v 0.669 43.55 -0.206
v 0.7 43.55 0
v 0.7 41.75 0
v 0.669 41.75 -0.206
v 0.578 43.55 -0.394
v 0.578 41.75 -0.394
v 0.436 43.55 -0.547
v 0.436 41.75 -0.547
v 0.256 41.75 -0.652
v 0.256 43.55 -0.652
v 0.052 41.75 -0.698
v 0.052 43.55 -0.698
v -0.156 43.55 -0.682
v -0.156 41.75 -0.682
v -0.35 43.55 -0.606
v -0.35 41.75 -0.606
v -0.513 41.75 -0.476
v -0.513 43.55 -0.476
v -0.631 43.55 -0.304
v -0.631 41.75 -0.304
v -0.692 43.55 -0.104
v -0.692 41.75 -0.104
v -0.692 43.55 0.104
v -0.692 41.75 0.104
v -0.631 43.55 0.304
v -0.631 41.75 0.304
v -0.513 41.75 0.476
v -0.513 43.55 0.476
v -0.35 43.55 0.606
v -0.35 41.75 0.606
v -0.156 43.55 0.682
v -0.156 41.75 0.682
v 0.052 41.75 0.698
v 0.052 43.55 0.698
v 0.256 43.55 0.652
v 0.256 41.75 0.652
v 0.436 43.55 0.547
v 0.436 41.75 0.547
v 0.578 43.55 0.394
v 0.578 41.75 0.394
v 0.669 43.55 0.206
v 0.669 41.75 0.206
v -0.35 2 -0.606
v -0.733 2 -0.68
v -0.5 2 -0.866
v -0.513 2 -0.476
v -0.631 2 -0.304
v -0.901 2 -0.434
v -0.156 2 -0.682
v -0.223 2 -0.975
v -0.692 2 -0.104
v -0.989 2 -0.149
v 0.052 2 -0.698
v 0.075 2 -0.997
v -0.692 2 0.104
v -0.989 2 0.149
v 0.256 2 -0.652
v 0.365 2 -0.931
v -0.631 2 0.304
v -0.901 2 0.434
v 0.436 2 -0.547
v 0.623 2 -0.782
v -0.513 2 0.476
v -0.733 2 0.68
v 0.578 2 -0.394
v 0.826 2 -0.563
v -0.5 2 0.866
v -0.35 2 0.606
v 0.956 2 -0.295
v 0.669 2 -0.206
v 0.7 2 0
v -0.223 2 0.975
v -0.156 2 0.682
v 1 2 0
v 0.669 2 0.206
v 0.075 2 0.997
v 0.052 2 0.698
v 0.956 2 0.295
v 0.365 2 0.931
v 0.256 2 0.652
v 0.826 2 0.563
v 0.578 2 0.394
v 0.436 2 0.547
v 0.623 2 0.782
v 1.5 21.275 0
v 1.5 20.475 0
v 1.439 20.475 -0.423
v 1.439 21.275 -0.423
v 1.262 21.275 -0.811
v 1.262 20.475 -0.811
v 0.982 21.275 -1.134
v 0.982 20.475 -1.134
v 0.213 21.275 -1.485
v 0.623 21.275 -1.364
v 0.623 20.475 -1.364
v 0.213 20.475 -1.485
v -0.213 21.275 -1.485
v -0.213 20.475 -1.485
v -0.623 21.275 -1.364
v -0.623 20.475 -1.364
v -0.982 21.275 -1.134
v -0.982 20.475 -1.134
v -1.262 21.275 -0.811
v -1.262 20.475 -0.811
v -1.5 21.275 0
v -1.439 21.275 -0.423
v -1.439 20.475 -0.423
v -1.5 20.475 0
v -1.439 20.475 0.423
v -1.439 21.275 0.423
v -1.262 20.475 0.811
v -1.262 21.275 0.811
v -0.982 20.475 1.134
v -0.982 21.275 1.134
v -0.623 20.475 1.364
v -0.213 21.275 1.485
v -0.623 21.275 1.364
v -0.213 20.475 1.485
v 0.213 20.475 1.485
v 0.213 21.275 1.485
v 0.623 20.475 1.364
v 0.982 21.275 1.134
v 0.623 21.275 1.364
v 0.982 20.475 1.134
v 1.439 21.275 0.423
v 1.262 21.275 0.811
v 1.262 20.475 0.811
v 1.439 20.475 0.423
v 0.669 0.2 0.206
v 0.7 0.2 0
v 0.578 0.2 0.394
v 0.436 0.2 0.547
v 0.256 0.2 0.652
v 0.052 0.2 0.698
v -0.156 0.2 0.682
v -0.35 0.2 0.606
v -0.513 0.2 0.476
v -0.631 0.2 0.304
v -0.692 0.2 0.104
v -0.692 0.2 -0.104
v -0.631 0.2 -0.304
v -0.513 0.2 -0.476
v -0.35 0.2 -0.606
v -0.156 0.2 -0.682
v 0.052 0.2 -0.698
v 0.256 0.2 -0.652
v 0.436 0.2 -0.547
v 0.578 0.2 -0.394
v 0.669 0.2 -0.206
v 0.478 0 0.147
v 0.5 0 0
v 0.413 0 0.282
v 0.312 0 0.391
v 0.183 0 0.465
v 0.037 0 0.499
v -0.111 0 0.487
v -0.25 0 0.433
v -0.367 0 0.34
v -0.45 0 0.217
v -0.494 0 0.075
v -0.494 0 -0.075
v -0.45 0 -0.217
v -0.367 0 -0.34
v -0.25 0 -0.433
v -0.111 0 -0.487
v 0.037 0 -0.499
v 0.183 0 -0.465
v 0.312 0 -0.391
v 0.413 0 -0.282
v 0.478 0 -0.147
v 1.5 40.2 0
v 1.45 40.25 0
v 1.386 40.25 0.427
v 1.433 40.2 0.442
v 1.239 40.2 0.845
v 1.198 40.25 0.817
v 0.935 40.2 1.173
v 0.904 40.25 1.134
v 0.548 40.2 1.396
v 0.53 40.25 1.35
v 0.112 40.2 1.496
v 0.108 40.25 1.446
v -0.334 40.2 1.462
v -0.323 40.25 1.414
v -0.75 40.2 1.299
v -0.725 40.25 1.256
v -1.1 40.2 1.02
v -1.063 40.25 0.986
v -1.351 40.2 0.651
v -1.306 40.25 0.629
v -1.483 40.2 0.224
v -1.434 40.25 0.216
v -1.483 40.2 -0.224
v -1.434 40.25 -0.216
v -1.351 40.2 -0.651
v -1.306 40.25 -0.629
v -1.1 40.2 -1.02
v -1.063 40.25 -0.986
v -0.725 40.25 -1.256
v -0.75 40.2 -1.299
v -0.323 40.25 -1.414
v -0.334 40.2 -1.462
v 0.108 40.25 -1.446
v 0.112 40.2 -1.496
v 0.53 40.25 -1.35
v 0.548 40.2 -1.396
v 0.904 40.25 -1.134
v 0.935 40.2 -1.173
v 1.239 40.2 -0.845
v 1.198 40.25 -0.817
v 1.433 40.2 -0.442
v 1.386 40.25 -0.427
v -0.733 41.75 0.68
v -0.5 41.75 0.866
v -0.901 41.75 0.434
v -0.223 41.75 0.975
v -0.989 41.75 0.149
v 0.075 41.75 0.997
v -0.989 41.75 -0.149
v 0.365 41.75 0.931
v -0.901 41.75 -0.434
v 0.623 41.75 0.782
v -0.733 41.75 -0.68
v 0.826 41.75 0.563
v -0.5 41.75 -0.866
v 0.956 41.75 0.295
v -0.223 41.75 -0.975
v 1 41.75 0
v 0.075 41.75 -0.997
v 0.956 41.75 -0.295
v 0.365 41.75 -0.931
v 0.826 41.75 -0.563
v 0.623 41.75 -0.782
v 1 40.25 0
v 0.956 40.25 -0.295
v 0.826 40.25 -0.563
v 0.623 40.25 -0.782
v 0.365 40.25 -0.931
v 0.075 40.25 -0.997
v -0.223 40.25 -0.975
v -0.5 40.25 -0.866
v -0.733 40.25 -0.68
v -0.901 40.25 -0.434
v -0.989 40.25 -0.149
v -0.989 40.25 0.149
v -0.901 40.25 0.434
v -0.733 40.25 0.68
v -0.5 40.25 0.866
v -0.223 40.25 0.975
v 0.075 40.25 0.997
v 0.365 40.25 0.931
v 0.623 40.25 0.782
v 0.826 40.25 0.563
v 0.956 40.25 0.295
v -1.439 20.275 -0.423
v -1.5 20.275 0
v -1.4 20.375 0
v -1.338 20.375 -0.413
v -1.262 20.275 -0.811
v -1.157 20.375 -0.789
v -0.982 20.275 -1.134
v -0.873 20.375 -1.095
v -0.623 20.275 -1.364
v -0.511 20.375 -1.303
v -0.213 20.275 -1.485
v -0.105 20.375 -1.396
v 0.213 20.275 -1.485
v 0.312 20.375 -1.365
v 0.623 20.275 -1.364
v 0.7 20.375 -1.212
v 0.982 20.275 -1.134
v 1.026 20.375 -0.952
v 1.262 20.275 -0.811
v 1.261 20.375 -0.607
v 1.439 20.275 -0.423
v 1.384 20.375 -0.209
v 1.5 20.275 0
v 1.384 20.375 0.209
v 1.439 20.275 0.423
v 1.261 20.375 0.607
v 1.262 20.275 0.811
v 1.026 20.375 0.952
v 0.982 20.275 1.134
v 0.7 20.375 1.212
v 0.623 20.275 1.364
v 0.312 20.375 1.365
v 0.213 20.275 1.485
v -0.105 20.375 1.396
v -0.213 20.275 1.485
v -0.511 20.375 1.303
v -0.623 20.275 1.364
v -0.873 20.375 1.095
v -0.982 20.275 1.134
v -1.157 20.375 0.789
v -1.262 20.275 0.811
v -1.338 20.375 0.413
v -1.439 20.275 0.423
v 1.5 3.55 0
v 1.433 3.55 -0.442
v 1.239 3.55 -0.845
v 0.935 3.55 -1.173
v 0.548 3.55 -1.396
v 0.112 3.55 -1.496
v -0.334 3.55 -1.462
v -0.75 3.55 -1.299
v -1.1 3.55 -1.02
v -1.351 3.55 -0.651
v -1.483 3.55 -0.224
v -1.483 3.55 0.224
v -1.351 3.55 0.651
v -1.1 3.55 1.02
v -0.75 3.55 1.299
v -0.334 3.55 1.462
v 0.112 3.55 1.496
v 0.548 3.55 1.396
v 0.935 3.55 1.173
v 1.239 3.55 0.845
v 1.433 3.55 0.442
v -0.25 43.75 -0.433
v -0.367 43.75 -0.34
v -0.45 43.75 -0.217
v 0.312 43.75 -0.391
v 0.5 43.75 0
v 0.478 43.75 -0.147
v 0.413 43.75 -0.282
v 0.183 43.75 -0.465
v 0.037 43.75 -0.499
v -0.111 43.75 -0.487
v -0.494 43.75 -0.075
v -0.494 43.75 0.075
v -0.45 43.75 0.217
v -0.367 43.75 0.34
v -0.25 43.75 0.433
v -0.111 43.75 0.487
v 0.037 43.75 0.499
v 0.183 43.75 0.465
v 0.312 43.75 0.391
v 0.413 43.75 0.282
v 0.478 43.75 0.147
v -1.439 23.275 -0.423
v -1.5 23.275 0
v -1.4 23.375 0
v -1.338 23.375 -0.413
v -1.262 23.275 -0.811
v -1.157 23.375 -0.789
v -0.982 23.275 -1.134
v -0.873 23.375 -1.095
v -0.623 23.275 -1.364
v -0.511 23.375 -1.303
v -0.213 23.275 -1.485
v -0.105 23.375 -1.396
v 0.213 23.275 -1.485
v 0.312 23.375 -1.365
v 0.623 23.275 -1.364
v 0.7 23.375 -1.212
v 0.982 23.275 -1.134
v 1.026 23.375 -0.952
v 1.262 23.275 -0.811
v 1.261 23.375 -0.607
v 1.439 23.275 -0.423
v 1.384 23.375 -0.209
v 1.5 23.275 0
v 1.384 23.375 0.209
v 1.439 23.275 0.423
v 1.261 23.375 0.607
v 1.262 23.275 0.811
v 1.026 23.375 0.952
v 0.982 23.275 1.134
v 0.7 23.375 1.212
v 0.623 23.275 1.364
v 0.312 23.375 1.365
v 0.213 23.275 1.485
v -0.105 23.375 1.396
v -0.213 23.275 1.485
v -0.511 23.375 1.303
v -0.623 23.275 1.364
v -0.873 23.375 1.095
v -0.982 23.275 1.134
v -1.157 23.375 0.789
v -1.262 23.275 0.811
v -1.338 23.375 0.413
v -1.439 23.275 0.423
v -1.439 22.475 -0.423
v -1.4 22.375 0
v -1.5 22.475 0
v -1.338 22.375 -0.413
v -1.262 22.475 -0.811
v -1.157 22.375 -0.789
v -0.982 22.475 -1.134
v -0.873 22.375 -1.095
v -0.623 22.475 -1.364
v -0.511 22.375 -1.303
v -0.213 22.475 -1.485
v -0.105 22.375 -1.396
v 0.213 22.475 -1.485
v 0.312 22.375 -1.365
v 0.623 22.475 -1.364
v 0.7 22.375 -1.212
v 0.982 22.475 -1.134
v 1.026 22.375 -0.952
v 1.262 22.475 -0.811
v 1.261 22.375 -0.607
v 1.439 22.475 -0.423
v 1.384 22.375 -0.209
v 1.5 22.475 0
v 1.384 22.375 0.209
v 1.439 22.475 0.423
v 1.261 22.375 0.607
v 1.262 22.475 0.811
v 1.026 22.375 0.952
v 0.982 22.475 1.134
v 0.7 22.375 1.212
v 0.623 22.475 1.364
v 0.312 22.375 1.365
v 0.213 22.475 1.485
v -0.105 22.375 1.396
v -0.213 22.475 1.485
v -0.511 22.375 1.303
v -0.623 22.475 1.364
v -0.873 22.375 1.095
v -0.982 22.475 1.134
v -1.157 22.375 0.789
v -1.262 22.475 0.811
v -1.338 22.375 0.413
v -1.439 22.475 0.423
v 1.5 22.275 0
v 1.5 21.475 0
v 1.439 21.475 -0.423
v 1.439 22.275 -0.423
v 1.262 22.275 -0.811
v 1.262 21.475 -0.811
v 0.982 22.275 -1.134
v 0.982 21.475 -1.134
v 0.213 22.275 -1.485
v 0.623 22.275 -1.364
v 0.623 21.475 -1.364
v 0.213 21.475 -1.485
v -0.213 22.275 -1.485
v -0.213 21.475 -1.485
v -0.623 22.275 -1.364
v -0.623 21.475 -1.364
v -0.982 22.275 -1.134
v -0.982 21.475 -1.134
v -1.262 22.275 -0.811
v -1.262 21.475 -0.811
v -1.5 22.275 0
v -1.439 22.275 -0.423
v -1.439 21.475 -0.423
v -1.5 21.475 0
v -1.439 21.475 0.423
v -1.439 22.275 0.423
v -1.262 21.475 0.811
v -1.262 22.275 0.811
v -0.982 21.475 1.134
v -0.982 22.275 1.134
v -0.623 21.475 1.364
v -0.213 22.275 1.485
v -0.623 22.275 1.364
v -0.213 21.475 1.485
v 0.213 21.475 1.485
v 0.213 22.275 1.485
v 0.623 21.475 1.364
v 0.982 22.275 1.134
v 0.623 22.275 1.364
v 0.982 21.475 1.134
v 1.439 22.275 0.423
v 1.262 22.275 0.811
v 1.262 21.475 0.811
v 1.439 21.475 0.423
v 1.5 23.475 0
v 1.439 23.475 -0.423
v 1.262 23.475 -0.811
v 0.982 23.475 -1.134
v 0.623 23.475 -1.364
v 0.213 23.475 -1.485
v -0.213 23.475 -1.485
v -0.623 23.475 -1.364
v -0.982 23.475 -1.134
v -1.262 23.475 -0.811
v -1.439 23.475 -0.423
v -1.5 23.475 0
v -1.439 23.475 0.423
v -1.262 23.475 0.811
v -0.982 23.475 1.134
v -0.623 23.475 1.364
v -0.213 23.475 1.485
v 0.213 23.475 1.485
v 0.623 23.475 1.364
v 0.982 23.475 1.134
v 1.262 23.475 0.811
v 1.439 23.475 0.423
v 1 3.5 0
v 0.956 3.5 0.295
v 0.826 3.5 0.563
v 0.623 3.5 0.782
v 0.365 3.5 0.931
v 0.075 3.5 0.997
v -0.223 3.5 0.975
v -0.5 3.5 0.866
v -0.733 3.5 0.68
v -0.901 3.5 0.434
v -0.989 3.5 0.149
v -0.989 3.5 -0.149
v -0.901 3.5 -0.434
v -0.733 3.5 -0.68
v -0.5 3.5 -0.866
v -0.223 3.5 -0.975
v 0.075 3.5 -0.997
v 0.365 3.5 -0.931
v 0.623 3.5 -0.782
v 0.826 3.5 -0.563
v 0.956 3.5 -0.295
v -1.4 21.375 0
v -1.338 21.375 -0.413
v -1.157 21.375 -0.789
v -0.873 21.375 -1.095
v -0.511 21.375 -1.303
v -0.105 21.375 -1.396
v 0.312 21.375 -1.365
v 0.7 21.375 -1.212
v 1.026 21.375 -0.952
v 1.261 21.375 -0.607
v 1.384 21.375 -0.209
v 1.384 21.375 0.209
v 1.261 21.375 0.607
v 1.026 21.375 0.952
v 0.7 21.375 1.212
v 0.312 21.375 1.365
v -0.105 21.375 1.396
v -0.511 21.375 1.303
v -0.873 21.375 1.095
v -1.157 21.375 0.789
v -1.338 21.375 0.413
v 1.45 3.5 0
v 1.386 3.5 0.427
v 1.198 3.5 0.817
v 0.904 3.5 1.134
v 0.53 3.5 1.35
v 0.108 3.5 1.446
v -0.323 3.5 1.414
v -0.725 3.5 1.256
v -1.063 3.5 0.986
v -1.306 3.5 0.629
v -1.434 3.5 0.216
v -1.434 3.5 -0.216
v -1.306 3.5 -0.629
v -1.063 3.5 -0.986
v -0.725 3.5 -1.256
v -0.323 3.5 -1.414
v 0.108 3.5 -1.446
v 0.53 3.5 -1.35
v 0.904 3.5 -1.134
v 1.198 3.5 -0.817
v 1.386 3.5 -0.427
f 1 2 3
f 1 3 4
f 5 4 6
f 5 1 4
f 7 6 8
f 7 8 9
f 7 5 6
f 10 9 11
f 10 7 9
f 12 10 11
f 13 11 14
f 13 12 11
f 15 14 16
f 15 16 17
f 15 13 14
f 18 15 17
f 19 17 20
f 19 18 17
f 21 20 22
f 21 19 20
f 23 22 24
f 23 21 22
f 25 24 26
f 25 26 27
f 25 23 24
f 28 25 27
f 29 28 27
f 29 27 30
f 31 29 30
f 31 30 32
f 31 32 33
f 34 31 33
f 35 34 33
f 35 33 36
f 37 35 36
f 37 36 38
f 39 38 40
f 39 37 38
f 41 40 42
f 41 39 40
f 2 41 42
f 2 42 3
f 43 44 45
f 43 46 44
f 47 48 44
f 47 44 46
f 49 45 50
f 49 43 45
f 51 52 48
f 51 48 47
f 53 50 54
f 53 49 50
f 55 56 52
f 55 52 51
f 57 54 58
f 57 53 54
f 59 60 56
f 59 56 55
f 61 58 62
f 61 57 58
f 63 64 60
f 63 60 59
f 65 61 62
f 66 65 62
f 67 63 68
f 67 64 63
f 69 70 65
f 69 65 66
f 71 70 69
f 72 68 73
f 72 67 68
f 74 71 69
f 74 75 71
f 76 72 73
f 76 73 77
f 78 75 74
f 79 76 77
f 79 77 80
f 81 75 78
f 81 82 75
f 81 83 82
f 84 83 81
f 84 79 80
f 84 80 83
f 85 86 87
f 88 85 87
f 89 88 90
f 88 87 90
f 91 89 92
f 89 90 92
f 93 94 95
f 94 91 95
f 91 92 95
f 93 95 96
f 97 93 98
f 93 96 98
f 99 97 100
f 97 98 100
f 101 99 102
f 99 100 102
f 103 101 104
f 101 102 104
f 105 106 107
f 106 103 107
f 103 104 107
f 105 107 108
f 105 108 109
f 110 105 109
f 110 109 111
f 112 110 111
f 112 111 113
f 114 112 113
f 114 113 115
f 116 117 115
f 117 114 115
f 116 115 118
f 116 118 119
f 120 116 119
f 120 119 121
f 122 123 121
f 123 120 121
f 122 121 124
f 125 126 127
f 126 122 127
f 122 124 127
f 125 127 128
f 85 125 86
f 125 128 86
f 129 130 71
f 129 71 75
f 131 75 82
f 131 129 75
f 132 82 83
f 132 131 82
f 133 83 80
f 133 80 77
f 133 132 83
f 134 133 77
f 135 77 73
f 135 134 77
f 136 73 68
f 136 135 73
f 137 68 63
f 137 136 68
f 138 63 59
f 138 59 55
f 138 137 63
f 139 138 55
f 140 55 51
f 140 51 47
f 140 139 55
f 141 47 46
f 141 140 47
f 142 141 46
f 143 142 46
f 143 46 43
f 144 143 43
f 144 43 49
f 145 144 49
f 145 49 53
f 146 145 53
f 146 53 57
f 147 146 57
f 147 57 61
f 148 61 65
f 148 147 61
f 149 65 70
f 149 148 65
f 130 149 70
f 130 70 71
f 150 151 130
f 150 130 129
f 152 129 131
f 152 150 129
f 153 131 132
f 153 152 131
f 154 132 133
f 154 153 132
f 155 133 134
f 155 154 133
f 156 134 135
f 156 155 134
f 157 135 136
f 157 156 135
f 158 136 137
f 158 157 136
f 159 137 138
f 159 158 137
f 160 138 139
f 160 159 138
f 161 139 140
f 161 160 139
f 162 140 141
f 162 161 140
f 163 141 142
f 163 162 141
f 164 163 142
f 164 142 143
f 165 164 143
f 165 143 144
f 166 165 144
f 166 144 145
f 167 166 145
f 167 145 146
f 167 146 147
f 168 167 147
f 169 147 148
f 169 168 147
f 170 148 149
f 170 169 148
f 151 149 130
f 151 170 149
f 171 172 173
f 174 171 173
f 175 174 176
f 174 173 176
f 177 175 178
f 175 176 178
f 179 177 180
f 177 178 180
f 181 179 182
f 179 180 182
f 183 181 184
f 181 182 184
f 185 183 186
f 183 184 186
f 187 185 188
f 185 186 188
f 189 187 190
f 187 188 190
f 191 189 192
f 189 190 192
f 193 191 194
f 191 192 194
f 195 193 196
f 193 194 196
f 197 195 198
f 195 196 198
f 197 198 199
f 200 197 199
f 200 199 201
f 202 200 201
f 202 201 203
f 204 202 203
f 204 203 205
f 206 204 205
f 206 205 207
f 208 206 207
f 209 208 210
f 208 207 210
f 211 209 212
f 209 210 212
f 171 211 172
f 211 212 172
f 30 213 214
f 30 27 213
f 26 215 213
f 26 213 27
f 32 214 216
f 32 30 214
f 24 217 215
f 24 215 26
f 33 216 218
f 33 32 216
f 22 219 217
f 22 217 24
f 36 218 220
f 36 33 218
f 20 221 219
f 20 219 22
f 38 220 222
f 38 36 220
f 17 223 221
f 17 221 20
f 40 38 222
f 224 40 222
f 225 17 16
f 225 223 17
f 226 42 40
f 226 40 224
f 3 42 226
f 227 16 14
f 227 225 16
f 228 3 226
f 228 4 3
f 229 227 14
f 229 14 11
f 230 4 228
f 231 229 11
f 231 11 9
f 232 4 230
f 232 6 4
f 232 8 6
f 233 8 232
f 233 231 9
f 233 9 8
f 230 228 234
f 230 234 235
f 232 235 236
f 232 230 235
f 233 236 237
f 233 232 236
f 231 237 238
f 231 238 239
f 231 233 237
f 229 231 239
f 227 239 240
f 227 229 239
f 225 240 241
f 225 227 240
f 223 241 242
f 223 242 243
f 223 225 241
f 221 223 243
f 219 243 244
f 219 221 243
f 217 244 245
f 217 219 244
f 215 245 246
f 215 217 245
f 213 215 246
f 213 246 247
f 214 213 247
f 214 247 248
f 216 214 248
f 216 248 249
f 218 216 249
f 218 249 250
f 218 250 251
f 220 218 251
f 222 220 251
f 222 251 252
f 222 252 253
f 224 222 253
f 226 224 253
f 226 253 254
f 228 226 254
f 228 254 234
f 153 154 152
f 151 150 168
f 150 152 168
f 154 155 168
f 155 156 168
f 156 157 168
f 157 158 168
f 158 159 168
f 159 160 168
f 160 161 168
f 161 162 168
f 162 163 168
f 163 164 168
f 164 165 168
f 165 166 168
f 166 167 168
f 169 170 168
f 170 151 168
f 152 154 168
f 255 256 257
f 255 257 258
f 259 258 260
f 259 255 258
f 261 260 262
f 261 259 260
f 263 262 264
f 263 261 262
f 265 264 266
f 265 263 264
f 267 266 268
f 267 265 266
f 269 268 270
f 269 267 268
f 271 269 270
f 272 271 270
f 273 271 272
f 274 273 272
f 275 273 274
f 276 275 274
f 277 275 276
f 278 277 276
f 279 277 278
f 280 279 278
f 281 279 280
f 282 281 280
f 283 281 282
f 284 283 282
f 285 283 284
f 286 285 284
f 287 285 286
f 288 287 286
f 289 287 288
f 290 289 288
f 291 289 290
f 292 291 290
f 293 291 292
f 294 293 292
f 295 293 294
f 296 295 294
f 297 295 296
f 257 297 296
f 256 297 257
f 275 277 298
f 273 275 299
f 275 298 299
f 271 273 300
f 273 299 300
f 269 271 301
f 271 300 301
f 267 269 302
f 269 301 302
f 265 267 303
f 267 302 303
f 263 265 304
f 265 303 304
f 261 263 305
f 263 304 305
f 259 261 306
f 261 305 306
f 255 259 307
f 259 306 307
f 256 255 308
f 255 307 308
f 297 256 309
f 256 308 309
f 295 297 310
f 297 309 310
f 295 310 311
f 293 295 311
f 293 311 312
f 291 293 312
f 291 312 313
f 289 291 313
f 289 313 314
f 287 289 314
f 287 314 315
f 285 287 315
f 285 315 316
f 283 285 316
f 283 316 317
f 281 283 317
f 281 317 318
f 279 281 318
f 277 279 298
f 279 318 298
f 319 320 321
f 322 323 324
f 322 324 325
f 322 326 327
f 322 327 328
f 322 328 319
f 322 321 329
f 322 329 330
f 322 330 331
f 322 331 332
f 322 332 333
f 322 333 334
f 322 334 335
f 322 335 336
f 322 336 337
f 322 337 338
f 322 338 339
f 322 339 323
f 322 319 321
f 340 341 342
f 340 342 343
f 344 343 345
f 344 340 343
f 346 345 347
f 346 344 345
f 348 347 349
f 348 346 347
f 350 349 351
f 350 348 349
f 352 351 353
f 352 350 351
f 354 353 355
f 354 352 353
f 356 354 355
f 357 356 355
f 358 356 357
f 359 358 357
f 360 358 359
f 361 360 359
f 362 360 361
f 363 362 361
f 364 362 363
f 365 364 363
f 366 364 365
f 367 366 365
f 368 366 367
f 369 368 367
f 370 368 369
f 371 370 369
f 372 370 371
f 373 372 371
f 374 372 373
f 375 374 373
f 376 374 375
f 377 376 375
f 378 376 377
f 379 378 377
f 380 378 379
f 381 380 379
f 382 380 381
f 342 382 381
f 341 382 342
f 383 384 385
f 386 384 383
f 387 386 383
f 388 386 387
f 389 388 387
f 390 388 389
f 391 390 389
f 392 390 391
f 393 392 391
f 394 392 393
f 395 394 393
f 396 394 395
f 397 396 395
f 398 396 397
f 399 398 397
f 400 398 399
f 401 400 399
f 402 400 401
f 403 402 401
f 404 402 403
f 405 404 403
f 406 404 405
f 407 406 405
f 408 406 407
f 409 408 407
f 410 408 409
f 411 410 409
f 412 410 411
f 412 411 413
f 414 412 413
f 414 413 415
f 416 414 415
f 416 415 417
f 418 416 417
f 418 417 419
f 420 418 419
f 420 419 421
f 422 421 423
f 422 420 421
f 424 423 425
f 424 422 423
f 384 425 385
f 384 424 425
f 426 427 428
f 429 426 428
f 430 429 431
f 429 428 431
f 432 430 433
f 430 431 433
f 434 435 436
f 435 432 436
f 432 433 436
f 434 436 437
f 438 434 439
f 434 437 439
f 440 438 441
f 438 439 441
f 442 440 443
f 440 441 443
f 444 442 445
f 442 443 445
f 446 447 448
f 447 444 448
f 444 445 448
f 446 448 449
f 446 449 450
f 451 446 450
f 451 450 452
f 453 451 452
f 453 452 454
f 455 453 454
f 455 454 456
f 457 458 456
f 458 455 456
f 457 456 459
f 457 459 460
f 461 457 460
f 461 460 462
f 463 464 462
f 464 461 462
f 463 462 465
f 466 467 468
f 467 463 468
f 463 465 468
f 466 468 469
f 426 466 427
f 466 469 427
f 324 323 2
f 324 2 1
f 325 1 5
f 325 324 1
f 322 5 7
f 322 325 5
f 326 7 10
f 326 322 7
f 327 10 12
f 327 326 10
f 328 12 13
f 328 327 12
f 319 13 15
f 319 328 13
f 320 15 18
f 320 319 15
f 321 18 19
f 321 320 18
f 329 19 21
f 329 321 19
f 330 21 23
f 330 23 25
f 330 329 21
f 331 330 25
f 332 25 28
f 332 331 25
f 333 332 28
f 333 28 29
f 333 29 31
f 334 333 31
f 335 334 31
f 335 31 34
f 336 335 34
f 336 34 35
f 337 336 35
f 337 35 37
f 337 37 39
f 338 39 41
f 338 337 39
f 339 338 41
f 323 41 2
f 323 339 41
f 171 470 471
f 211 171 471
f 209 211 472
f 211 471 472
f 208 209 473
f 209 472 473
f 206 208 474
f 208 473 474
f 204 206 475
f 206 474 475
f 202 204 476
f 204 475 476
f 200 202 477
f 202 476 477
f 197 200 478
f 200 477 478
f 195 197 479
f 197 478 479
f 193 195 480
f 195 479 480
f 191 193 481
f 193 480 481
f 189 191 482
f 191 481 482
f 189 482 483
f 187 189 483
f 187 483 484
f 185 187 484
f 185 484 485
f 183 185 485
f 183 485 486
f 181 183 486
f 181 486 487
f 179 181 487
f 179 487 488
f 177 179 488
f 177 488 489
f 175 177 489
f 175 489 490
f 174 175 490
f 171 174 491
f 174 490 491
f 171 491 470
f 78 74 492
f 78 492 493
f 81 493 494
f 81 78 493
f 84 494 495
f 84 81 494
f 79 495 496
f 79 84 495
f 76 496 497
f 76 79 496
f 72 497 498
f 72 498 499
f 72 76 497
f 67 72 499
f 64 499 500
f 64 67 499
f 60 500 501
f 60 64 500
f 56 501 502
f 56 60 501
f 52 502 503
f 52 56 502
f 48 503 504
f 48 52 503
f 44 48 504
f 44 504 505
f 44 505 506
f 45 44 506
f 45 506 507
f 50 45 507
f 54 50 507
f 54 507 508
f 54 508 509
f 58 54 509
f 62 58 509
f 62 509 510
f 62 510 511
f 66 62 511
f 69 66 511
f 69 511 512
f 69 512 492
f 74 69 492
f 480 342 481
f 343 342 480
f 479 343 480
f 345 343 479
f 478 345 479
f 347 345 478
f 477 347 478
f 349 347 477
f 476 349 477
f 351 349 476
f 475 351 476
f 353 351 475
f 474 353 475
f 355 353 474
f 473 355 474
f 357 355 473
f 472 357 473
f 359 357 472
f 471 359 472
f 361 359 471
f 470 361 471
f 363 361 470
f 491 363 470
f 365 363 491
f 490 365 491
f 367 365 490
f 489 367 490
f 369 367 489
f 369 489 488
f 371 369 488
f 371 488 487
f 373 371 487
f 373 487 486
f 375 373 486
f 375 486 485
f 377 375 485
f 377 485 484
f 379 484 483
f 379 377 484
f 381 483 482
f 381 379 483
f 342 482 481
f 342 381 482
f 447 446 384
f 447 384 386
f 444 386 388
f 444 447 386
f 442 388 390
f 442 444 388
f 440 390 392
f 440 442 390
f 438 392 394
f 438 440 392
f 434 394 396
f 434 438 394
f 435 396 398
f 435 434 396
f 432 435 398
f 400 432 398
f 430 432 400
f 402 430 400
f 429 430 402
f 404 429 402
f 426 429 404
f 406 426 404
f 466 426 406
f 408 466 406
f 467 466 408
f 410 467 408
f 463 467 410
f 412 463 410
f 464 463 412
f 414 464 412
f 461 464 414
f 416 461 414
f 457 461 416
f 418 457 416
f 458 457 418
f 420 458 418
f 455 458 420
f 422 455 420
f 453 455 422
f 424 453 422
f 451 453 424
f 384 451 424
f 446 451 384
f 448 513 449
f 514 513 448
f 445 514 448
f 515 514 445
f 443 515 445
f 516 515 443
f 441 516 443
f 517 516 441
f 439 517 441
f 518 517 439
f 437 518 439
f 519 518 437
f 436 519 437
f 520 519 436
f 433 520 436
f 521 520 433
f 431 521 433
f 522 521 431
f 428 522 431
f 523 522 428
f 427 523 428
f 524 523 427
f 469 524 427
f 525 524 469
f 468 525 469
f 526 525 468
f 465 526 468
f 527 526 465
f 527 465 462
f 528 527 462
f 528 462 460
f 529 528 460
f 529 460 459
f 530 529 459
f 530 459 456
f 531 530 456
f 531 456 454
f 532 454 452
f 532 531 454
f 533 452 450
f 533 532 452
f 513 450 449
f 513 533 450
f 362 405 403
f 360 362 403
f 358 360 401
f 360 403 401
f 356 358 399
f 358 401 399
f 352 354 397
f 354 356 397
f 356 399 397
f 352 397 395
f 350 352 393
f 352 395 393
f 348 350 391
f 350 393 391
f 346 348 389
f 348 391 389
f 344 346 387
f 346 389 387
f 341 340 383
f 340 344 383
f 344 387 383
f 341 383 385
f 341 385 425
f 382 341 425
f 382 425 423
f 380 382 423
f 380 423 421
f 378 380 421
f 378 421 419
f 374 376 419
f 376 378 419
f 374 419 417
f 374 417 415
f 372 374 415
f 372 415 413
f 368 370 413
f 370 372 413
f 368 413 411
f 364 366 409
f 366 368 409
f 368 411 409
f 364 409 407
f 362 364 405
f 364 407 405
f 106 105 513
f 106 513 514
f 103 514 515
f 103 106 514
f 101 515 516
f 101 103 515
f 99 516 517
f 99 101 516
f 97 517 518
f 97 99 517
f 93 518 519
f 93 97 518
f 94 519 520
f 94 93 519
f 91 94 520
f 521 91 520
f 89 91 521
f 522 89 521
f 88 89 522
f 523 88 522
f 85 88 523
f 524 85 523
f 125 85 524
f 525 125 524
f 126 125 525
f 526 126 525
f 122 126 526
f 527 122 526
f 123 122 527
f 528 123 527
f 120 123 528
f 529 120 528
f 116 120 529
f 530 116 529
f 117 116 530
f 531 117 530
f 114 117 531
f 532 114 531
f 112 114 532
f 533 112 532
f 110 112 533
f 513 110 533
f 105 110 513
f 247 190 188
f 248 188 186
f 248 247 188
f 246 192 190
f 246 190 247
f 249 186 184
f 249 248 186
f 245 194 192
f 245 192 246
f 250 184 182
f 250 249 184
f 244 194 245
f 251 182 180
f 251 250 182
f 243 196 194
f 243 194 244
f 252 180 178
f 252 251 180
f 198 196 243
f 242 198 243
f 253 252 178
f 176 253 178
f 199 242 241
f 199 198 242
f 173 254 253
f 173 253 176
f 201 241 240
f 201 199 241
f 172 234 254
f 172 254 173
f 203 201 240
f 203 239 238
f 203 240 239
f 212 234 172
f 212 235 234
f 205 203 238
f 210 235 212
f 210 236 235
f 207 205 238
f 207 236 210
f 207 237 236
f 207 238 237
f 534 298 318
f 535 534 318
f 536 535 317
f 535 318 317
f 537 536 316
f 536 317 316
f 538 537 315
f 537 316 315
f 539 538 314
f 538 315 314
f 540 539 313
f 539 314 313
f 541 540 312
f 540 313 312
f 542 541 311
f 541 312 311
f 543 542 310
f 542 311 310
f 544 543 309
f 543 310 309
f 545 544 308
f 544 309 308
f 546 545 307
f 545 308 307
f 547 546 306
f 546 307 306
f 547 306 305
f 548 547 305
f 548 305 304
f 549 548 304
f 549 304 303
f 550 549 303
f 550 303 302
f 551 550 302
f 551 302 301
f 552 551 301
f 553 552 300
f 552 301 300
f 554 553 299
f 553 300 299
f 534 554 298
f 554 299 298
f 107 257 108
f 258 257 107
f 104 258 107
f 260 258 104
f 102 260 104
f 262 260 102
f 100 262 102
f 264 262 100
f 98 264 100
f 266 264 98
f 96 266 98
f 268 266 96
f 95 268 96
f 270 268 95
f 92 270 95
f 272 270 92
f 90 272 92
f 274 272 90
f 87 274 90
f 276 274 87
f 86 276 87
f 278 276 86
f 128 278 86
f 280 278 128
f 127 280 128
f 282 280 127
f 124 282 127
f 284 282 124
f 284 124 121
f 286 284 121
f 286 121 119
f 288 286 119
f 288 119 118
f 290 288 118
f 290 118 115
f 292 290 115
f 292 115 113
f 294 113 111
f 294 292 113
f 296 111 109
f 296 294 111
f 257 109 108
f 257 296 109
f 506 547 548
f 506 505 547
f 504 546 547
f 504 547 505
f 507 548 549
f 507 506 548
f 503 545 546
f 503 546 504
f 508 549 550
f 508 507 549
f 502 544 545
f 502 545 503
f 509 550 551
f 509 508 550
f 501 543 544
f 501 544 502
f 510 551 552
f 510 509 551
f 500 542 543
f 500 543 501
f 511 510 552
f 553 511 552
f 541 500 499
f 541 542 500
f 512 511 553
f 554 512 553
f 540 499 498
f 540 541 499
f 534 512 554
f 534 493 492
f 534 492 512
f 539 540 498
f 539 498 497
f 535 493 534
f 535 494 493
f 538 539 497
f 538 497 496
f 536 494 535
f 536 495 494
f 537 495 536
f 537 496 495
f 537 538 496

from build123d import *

# Parameters (mm, degrees)
SKETCH1_R           = 1.5
BOSS_EXTRUDE1_DEPTH = 43.75
SKETCH2_OUTSIDE_W   = 13.792
SKETCH2_OUTSIDE_H   = 13.792
SKETCH2_OUTSIDE_R   = 1
CUT_EXTRUDE1_DEPTH  = 3.5
SKETCH3_OUTSIDE_W   = 13.792
SKETCH3_OUTSIDE_H   = 13.792
SKETCH3_OUTSIDE_R   = 0.7
CUT_EXTRUDE2_DEPTH  = 2
SKETCH4_OUTSIDE_W   = 13.792
SKETCH4_OUTSIDE_H   = 13.792
SKETCH4_OUTSIDE_R   = 1
CUT_EXTRUDE5_DEPTH  = 3.5
SKETCH5_OUTSIDE_W   = 13.792
SKETCH5_OUTSIDE_H   = 13.792
SKETCH5_OUTSIDE_R   = 0.7
CUT_EXTRUDE6_DEPTH  = 2
LPATTERN1_COUNT     = 4
LPATTERN1_PITCH     = 1
CHAMFER3_SIZE       = 0.2
CHAMFER4_SIZE       = 0.05


with BuildPart() as part:
    # Sketch1 → Boss-Extrude1 (new body)
    with BuildSketch(Plane(origin=(0, 0, 0), x_dir=(1, 0, 0), z_dir=(0, 1, 0))):
        Circle(SKETCH1_R)
    extrude(amount=BOSS_EXTRUDE1_DEPTH)

    # Sketch2 outside → Cut-Extrude1 (cut)
    with BuildSketch(Plane(origin=(0, 43.75, 0), x_dir=(1, 0, 0), z_dir=(0, 1, 0))):
        Rectangle(SKETCH2_OUTSIDE_W, SKETCH2_OUTSIDE_H)
        Circle(SKETCH2_OUTSIDE_R, mode=Mode.SUBTRACT)
    extrude(amount=-CUT_EXTRUDE1_DEPTH, mode=Mode.SUBTRACT)

    # Sketch3 outside → Cut-Extrude2 (cut)
    with BuildSketch(Plane(origin=(0, 43.75, 0), x_dir=(1, 0, 0), z_dir=(0, 1, 0))):
        Rectangle(SKETCH3_OUTSIDE_W, SKETCH3_OUTSIDE_H)
        Circle(SKETCH3_OUTSIDE_R, mode=Mode.SUBTRACT)
    extrude(amount=-CUT_EXTRUDE2_DEPTH, mode=Mode.SUBTRACT)

    # Sketch4 outside → Cut-Extrude5 (cut)
    with BuildSketch(Plane.XZ):
        Rectangle(SKETCH4_OUTSIDE_W, SKETCH4_OUTSIDE_H)
        Circle(SKETCH4_OUTSIDE_R, mode=Mode.SUBTRACT)
    extrude(amount=-CUT_EXTRUDE5_DEPTH, mode=Mode.SUBTRACT)

    # Sketch5 outside → Cut-Extrude6 (cut)
    with BuildSketch(Plane.XZ):
        Rectangle(SKETCH5_OUTSIDE_W, SKETCH5_OUTSIDE_H)
        Circle(SKETCH5_OUTSIDE_R, mode=Mode.SUBTRACT)
    extrude(amount=-CUT_EXTRUDE6_DEPTH, mode=Mode.SUBTRACT)

    # Sketch6 → Cut-Revolve1 (revolve, cut)
    with BuildSketch(Plane.XY):
        Polygon((-1.5, 23.475), (-1.4, 23.375), (-1.5, 23.275), align=None)
    cut_revolve1 = revolve(axis=Axis((0, 43.75, 0), (0, -1, 0)), mode=Mode.SUBTRACT)

    # LPattern1: Cut-Revolve1 ×4
    with Locations(*[(0, -i * LPATTERN1_PITCH, 0) for i in range(1, LPATTERN1_COUNT)]):
        add(cut_revolve1, mode=Mode.SUBTRACT)

    # Chamfer3
    chamfer3_edges = [part.edges().sort_by_distance(p)[0] for p in [
        (-0.7, 43.75, 0),
        (-0.7, 0, 0),
    ]]
    chamfer(chamfer3_edges, length=CHAMFER3_SIZE)

    # Chamfer4
    chamfer4_edges = [part.edges().sort_by_distance(p)[0] for p in [
        (-1.5, 3.5, 0),
        (-1.5, 40.25, 0),
    ]]
    chamfer(chamfer4_edges, length=CHAMFER4_SIZE)


solid = part.part
